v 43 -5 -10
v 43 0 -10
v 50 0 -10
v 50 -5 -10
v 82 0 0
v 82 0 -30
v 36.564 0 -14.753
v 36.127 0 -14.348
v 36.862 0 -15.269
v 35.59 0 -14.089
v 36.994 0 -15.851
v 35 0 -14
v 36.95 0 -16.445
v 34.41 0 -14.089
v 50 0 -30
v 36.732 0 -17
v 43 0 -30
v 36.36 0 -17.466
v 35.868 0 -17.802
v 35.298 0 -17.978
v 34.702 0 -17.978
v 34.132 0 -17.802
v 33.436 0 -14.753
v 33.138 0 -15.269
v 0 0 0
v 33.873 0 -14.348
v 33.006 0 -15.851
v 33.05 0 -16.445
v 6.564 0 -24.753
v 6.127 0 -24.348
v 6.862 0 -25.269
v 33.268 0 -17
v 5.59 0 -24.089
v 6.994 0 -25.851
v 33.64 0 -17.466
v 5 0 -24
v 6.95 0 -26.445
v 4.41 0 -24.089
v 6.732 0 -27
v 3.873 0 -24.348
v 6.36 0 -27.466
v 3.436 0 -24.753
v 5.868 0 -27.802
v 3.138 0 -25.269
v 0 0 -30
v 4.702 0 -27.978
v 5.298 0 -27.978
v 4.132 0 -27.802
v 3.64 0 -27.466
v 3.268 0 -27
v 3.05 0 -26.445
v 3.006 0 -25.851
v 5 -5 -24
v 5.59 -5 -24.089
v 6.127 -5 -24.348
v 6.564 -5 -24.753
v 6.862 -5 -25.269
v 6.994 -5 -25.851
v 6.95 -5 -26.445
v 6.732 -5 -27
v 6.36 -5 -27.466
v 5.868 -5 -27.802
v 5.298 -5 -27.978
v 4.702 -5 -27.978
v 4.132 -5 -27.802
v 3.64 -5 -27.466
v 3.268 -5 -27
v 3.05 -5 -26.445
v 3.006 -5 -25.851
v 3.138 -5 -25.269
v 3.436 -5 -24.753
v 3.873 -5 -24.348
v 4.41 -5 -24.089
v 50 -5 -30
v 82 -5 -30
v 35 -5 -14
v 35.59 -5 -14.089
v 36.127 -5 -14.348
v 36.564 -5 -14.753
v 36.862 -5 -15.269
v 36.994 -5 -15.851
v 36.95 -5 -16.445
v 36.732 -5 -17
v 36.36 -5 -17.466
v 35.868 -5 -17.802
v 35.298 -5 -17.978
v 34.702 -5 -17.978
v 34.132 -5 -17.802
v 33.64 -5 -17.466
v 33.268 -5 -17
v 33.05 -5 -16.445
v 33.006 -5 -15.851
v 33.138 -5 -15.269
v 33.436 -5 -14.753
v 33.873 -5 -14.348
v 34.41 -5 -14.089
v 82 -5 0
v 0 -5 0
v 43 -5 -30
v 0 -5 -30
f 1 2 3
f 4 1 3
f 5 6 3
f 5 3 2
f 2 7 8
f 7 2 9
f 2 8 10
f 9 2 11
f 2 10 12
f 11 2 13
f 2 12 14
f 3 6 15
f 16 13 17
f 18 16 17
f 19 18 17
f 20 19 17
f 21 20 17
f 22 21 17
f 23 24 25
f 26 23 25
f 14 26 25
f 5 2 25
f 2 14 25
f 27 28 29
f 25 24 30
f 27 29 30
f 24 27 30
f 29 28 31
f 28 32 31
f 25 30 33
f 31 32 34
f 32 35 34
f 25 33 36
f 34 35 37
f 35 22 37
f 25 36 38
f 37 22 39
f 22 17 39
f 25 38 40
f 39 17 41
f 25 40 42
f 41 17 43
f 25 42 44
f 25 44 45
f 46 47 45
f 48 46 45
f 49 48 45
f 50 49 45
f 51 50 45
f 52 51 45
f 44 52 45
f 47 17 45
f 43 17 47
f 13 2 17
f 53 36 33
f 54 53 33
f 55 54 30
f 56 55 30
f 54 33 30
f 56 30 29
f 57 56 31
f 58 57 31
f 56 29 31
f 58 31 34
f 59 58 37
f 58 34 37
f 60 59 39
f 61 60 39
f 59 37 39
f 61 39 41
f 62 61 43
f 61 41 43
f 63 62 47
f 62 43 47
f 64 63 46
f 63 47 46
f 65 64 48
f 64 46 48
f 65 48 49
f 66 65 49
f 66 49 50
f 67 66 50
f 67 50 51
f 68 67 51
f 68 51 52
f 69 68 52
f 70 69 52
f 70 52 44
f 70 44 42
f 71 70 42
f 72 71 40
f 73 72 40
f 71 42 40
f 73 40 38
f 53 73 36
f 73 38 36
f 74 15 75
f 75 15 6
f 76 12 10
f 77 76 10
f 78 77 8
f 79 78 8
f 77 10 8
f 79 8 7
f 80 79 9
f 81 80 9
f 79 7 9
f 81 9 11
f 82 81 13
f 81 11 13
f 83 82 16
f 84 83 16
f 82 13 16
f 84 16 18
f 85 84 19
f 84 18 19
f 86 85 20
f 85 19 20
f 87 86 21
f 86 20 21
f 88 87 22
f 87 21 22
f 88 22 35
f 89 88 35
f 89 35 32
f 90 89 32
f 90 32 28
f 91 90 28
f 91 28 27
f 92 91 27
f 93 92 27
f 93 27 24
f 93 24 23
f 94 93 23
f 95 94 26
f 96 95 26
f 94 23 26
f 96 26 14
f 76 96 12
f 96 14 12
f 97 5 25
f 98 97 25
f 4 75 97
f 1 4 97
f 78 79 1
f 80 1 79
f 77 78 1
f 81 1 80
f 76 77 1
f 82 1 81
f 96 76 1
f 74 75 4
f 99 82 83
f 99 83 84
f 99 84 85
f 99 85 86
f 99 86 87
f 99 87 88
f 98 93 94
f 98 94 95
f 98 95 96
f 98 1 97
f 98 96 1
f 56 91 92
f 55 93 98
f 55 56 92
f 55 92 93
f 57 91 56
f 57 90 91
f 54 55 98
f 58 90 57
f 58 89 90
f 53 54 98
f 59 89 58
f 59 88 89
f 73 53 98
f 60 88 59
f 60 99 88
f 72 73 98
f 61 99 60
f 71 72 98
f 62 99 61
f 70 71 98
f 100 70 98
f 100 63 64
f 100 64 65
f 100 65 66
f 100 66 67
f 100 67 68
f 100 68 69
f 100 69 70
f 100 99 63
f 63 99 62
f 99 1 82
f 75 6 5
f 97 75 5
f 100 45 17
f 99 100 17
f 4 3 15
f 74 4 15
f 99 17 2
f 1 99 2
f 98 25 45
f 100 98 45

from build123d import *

# Parameters (mm, degrees)
SKETCH1_R           = 2
BOSS_EXTRUDE1_DEPTH = 5


with BuildPart() as part:
    # Sketch1 → Boss-Extrude1 (new body)
    with BuildSketch(Plane(origin=(0, 0, 0), x_dir=(1, 0, 0), z_dir=(0, 1, 0))):
        Polygon((50, 30), (82, 30), (82, 0), (0, 0), (0, 30), (43, 30), (43, 10), (50, 10), align=None)
        with Locations(Location((5, 26, 0), (0, 0, 270))):
            Circle(SKETCH1_R, mode=Mode.SUBTRACT)
        with Locations(Location((35, 16, 0), (0, 0, 270))):
            Circle(SKETCH1_R, mode=Mode.SUBTRACT)
    extrude(amount=-BOSS_EXTRUDE1_DEPTH)


solid = part.part
